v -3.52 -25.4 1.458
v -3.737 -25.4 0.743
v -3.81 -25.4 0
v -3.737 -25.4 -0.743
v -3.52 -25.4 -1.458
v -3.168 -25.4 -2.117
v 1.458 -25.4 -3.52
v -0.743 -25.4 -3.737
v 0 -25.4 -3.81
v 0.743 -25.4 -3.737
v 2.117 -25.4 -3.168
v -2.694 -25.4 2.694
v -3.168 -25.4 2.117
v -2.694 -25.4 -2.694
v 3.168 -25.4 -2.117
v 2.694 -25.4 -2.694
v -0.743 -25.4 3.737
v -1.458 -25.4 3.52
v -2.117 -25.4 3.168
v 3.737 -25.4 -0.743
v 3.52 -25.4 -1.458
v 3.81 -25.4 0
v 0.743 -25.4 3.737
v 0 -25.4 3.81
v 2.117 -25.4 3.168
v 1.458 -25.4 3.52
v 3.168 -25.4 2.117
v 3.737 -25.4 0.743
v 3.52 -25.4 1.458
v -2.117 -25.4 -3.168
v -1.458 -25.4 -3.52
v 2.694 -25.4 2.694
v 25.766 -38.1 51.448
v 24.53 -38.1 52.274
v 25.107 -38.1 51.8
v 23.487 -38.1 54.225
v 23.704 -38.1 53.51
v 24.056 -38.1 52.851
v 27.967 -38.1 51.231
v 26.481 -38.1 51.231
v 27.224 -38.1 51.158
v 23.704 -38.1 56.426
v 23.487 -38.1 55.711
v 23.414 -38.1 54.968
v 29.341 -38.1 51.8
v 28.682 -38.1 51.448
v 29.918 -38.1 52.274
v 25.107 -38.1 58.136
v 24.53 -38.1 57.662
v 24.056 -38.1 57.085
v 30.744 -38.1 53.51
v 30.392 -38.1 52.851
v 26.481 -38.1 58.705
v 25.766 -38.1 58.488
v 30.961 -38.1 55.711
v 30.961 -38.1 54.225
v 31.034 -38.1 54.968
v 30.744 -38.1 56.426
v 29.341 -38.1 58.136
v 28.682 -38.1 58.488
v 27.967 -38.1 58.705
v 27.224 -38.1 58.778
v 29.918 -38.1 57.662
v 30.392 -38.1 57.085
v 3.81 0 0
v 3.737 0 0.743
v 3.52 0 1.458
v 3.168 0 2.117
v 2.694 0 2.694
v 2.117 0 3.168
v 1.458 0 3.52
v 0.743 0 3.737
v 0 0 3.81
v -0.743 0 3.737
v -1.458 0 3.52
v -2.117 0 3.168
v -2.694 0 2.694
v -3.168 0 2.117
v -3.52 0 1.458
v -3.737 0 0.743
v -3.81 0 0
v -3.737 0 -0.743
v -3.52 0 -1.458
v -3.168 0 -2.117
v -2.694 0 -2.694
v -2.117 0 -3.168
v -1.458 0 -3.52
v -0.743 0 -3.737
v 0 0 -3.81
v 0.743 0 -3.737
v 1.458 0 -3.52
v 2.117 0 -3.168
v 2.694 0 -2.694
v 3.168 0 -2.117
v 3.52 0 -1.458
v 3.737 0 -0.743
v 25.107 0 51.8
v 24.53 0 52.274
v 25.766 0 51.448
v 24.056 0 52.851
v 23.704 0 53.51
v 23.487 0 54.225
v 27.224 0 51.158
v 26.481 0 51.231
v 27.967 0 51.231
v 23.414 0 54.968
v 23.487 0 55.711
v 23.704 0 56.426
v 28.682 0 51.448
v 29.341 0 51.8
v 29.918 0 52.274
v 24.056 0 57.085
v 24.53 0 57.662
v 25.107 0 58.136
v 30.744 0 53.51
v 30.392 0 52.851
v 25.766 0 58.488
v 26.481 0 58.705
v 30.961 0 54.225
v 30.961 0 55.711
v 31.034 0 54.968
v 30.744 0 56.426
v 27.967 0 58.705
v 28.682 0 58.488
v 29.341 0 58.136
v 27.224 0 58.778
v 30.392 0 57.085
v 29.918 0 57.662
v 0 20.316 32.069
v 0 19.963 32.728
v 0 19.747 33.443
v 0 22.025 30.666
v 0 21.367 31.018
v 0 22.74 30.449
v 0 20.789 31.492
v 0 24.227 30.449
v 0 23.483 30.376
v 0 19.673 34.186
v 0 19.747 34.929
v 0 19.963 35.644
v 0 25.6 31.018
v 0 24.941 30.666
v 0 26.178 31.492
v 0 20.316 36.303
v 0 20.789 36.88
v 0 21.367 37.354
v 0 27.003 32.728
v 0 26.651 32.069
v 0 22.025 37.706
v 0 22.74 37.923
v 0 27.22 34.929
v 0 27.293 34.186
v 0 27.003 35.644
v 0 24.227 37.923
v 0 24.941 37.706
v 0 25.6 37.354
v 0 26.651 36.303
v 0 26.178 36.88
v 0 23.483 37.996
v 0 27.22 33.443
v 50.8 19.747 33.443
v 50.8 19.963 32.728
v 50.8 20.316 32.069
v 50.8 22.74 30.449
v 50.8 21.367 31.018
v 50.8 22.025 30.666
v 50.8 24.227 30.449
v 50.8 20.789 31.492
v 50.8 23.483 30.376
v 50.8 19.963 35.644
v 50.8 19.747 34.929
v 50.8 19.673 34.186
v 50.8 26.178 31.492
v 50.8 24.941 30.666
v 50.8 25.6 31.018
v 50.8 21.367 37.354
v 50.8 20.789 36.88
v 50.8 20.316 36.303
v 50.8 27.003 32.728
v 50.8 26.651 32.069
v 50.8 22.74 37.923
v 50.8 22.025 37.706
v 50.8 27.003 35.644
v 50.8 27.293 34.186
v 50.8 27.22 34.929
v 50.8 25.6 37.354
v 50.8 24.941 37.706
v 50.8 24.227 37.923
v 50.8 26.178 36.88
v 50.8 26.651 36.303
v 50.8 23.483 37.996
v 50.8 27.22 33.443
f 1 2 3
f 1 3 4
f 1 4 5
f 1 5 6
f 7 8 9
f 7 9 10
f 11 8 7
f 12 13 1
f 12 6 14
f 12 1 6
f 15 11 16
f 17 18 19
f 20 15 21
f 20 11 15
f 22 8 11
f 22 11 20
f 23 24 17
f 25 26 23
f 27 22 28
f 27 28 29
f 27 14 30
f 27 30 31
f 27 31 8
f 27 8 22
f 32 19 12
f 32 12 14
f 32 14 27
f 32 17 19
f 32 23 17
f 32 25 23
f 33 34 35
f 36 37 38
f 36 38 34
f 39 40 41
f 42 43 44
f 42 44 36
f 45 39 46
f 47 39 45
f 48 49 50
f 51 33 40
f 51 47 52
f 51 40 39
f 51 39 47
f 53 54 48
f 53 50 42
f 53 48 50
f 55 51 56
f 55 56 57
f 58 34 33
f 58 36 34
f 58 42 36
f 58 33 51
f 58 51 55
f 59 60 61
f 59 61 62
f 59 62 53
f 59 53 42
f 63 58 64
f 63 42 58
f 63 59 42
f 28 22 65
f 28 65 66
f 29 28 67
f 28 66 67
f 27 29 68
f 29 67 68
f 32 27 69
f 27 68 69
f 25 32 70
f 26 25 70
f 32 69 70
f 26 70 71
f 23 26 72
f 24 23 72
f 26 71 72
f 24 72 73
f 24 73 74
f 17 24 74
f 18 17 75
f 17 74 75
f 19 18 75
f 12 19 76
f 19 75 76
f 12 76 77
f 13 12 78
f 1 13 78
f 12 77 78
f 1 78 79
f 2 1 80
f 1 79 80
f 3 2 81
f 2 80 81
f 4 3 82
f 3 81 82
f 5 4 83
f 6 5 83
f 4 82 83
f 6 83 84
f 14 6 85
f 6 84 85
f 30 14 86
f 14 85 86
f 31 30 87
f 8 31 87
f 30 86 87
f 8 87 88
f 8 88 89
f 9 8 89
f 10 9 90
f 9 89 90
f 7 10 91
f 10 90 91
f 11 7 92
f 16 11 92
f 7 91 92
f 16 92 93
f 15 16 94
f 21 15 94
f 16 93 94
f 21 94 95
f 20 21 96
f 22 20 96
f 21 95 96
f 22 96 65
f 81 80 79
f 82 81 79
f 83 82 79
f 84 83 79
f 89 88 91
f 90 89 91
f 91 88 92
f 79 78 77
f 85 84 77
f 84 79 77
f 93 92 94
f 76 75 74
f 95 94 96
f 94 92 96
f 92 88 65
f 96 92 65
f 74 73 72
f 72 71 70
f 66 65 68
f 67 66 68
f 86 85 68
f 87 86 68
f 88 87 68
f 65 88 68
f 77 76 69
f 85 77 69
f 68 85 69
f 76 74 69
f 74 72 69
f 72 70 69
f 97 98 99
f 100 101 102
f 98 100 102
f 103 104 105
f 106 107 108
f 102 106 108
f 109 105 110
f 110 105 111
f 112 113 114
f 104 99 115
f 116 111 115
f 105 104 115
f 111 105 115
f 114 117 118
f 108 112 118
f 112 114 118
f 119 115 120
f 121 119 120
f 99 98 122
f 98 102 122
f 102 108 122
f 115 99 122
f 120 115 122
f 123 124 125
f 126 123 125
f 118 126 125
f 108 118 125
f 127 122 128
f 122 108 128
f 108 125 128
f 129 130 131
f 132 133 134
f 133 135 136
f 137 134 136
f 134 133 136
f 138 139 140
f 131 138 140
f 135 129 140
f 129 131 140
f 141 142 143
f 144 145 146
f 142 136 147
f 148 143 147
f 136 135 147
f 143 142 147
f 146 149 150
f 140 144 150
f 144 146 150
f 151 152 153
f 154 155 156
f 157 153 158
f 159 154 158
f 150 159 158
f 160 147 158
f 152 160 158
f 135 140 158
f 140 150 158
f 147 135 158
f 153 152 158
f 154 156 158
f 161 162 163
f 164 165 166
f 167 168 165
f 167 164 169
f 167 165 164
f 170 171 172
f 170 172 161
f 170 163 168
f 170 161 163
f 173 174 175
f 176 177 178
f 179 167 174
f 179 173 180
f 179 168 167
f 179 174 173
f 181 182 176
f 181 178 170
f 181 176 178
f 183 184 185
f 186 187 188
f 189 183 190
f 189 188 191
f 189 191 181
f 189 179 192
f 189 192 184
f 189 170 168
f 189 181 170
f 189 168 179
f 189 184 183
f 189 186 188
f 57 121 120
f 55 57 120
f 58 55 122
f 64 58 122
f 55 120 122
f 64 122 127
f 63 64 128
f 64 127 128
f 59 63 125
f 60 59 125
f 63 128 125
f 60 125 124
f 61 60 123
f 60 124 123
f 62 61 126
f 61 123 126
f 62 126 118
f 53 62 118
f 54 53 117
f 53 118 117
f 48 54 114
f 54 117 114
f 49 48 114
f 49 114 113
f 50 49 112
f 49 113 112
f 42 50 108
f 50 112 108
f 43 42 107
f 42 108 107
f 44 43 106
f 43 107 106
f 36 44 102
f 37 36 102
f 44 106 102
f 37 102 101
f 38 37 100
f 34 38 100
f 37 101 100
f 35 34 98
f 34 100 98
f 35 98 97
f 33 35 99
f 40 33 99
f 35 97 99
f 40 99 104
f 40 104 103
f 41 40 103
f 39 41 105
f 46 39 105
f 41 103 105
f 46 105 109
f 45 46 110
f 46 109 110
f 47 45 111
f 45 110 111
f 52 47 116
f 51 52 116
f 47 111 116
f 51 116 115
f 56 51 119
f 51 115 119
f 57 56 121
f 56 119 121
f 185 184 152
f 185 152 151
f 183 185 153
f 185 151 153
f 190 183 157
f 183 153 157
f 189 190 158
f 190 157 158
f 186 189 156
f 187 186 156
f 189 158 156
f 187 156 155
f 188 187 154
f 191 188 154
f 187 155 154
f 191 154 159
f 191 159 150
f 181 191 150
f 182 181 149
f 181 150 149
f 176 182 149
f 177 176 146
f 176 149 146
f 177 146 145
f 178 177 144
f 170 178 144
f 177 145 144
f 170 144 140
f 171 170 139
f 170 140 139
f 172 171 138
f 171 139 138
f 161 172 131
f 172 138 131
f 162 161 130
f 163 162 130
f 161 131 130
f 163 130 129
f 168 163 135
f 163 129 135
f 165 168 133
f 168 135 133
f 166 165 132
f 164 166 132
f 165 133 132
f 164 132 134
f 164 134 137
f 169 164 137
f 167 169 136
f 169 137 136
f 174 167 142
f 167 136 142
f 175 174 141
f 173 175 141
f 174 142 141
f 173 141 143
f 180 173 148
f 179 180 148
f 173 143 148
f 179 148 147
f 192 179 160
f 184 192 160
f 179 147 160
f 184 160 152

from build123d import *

# Parameters (mm, degrees)
F0_R     = 3.81
F1_DEPTH = 25.4
F2_R     = 3.81
F3_DEPTH = 38.1
F4_R     = 3.81
F5_DEPTH = 50.8


with BuildPart() as f1:
    # F0 (on Front) → F1 (new body)
    with BuildSketch(Plane.XZ):
        Circle(F0_R)
    extrude(amount=F1_DEPTH)


with BuildPart() as f3:
    # F2 (on Front) → F3 (new body)
    with BuildSketch(Plane.XZ):
        with Locations((27.224183, 54.96791)):
            Circle(F2_R)
    extrude(amount=F3_DEPTH)


with BuildPart() as f5:
    # F4 (on Right) → F5 (new body)
    with BuildSketch(Plane.YZ):
        with Locations((23.483455, 34.186091)):
            Circle(F4_R)
    extrude(amount=F5_DEPTH)


solid = Compound([f1.part, f3.part, f5.part])
